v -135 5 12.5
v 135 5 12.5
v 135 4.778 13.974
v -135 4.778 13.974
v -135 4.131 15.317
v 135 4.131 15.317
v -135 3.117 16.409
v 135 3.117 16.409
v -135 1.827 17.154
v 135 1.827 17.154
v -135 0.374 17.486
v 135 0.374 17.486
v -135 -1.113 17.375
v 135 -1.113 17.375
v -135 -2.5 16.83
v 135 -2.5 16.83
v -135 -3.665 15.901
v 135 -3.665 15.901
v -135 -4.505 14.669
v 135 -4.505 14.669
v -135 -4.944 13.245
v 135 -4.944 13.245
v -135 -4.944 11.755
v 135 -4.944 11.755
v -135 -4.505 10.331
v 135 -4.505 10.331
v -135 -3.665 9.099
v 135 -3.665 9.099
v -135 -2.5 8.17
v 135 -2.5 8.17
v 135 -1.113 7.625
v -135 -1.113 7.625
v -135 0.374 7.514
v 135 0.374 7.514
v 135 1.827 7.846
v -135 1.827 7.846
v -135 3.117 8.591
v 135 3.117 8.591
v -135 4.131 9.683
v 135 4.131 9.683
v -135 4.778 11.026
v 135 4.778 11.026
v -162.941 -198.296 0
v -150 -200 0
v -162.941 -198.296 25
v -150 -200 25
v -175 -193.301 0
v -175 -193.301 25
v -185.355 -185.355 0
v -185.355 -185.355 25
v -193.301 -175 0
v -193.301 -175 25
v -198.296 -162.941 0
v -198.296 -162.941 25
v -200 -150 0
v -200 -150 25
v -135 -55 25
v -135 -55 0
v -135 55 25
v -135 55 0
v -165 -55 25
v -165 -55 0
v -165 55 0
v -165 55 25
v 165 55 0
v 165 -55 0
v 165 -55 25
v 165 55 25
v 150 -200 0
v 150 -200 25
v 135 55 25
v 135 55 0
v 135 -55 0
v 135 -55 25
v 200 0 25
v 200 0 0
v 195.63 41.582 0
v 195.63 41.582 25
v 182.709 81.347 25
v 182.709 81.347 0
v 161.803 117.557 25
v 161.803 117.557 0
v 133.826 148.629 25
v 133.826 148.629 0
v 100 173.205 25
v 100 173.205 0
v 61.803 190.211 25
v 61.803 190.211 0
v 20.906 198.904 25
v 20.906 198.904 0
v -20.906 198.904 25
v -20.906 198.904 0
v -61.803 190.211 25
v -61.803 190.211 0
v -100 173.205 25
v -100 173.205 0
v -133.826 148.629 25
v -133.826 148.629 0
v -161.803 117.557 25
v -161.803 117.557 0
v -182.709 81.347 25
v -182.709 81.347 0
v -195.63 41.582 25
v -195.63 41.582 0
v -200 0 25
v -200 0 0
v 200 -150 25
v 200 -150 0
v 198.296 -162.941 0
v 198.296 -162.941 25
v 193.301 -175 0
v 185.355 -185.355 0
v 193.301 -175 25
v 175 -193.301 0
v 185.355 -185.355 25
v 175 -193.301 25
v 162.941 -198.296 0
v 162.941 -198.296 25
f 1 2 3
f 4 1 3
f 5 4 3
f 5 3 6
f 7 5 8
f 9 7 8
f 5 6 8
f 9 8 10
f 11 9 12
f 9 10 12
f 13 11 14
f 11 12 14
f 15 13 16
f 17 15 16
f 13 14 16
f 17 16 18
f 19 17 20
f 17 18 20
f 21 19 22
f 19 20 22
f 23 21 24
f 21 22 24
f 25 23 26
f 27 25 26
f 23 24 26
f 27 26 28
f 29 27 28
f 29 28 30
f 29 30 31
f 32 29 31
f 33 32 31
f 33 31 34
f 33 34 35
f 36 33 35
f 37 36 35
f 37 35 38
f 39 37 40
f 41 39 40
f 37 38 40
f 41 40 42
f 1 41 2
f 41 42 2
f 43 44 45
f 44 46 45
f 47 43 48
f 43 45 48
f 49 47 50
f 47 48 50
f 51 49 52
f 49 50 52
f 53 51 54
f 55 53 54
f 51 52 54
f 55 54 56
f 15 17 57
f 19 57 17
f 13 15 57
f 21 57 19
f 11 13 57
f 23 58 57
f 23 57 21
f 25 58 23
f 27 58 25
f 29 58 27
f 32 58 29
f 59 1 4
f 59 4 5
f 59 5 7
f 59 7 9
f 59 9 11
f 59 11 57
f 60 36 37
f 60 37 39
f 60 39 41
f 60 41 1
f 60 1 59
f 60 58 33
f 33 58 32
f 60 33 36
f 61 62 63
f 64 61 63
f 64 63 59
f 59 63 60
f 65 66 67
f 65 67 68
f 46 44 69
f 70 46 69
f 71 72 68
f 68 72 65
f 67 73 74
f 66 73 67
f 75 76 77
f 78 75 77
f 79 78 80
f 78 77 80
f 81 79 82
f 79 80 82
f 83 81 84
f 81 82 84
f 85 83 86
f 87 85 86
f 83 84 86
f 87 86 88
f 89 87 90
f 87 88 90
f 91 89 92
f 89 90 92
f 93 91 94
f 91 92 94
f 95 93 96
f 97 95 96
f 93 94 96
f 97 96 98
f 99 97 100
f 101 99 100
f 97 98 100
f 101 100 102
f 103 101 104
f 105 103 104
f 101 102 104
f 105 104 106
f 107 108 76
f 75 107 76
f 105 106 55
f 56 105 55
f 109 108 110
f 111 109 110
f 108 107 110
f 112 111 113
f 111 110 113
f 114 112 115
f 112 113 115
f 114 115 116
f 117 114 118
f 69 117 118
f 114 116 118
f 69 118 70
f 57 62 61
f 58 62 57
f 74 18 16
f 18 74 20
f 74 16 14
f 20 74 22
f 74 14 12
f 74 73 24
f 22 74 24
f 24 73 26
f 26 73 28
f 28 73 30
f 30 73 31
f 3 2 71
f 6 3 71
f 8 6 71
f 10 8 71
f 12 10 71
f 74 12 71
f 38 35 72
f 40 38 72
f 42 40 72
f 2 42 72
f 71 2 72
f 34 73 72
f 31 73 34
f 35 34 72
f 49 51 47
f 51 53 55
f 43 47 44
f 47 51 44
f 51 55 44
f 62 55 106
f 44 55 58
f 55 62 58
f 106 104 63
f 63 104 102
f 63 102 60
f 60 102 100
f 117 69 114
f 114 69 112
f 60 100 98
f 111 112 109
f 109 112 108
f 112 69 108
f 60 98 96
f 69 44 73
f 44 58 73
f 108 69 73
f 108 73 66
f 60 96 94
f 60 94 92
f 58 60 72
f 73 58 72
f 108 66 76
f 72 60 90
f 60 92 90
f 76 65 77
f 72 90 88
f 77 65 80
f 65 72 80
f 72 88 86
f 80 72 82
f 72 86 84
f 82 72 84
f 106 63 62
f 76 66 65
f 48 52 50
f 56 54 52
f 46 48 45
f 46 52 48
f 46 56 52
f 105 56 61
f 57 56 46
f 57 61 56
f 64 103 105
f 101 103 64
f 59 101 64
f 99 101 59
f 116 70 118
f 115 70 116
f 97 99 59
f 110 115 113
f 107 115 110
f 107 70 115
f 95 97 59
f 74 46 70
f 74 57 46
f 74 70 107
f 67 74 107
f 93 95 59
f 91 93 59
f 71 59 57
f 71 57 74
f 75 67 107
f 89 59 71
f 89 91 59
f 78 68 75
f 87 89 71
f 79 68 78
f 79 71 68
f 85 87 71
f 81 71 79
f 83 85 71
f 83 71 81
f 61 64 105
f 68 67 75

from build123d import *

# Parameters (mm, degrees)
F0_W     = 30
F0_H     = 110
F1_DEPTH = 25
F2_R     = 50
F3_R     = 5
F4_DEPTH = 270


with BuildPart() as f1:
    # F0 (on Top) → F1 (new body)
    with BuildSketch(Plane.XY):
        with BuildLine():
            Line((200, -200), (200, 0))
            ThreePointArc((200, 0), (0, 200), (-200, 0))
            Line((-200, 0), (-200, -200))
            Line((-200, -200), (200, -200))
        make_face()
        with Locations((-150, 0)):
            Rectangle(F0_W, F0_H, mode=Mode.SUBTRACT)
        with Locations((150, 0)):
            Rectangle(F0_W, F0_H, mode=Mode.SUBTRACT)
    extrude(amount=F1_DEPTH)

    # F2
    f2_edges = [f1.edges().sort_by_distance(p)[0] for p in [
        (200, -200, 12.5),
        (-200, -200, 12.5),
    ]]
    fillet(f2_edges, radius=F2_R)

    # F3 (on face) → F4 (cut, through all)
    with BuildSketch(Plane.YZ.offset(135)):
        with Locations((0, 12.5)):
            Circle(F3_R)
    extrude(amount=-F4_DEPTH, mode=Mode.SUBTRACT)


solid = f1.part
